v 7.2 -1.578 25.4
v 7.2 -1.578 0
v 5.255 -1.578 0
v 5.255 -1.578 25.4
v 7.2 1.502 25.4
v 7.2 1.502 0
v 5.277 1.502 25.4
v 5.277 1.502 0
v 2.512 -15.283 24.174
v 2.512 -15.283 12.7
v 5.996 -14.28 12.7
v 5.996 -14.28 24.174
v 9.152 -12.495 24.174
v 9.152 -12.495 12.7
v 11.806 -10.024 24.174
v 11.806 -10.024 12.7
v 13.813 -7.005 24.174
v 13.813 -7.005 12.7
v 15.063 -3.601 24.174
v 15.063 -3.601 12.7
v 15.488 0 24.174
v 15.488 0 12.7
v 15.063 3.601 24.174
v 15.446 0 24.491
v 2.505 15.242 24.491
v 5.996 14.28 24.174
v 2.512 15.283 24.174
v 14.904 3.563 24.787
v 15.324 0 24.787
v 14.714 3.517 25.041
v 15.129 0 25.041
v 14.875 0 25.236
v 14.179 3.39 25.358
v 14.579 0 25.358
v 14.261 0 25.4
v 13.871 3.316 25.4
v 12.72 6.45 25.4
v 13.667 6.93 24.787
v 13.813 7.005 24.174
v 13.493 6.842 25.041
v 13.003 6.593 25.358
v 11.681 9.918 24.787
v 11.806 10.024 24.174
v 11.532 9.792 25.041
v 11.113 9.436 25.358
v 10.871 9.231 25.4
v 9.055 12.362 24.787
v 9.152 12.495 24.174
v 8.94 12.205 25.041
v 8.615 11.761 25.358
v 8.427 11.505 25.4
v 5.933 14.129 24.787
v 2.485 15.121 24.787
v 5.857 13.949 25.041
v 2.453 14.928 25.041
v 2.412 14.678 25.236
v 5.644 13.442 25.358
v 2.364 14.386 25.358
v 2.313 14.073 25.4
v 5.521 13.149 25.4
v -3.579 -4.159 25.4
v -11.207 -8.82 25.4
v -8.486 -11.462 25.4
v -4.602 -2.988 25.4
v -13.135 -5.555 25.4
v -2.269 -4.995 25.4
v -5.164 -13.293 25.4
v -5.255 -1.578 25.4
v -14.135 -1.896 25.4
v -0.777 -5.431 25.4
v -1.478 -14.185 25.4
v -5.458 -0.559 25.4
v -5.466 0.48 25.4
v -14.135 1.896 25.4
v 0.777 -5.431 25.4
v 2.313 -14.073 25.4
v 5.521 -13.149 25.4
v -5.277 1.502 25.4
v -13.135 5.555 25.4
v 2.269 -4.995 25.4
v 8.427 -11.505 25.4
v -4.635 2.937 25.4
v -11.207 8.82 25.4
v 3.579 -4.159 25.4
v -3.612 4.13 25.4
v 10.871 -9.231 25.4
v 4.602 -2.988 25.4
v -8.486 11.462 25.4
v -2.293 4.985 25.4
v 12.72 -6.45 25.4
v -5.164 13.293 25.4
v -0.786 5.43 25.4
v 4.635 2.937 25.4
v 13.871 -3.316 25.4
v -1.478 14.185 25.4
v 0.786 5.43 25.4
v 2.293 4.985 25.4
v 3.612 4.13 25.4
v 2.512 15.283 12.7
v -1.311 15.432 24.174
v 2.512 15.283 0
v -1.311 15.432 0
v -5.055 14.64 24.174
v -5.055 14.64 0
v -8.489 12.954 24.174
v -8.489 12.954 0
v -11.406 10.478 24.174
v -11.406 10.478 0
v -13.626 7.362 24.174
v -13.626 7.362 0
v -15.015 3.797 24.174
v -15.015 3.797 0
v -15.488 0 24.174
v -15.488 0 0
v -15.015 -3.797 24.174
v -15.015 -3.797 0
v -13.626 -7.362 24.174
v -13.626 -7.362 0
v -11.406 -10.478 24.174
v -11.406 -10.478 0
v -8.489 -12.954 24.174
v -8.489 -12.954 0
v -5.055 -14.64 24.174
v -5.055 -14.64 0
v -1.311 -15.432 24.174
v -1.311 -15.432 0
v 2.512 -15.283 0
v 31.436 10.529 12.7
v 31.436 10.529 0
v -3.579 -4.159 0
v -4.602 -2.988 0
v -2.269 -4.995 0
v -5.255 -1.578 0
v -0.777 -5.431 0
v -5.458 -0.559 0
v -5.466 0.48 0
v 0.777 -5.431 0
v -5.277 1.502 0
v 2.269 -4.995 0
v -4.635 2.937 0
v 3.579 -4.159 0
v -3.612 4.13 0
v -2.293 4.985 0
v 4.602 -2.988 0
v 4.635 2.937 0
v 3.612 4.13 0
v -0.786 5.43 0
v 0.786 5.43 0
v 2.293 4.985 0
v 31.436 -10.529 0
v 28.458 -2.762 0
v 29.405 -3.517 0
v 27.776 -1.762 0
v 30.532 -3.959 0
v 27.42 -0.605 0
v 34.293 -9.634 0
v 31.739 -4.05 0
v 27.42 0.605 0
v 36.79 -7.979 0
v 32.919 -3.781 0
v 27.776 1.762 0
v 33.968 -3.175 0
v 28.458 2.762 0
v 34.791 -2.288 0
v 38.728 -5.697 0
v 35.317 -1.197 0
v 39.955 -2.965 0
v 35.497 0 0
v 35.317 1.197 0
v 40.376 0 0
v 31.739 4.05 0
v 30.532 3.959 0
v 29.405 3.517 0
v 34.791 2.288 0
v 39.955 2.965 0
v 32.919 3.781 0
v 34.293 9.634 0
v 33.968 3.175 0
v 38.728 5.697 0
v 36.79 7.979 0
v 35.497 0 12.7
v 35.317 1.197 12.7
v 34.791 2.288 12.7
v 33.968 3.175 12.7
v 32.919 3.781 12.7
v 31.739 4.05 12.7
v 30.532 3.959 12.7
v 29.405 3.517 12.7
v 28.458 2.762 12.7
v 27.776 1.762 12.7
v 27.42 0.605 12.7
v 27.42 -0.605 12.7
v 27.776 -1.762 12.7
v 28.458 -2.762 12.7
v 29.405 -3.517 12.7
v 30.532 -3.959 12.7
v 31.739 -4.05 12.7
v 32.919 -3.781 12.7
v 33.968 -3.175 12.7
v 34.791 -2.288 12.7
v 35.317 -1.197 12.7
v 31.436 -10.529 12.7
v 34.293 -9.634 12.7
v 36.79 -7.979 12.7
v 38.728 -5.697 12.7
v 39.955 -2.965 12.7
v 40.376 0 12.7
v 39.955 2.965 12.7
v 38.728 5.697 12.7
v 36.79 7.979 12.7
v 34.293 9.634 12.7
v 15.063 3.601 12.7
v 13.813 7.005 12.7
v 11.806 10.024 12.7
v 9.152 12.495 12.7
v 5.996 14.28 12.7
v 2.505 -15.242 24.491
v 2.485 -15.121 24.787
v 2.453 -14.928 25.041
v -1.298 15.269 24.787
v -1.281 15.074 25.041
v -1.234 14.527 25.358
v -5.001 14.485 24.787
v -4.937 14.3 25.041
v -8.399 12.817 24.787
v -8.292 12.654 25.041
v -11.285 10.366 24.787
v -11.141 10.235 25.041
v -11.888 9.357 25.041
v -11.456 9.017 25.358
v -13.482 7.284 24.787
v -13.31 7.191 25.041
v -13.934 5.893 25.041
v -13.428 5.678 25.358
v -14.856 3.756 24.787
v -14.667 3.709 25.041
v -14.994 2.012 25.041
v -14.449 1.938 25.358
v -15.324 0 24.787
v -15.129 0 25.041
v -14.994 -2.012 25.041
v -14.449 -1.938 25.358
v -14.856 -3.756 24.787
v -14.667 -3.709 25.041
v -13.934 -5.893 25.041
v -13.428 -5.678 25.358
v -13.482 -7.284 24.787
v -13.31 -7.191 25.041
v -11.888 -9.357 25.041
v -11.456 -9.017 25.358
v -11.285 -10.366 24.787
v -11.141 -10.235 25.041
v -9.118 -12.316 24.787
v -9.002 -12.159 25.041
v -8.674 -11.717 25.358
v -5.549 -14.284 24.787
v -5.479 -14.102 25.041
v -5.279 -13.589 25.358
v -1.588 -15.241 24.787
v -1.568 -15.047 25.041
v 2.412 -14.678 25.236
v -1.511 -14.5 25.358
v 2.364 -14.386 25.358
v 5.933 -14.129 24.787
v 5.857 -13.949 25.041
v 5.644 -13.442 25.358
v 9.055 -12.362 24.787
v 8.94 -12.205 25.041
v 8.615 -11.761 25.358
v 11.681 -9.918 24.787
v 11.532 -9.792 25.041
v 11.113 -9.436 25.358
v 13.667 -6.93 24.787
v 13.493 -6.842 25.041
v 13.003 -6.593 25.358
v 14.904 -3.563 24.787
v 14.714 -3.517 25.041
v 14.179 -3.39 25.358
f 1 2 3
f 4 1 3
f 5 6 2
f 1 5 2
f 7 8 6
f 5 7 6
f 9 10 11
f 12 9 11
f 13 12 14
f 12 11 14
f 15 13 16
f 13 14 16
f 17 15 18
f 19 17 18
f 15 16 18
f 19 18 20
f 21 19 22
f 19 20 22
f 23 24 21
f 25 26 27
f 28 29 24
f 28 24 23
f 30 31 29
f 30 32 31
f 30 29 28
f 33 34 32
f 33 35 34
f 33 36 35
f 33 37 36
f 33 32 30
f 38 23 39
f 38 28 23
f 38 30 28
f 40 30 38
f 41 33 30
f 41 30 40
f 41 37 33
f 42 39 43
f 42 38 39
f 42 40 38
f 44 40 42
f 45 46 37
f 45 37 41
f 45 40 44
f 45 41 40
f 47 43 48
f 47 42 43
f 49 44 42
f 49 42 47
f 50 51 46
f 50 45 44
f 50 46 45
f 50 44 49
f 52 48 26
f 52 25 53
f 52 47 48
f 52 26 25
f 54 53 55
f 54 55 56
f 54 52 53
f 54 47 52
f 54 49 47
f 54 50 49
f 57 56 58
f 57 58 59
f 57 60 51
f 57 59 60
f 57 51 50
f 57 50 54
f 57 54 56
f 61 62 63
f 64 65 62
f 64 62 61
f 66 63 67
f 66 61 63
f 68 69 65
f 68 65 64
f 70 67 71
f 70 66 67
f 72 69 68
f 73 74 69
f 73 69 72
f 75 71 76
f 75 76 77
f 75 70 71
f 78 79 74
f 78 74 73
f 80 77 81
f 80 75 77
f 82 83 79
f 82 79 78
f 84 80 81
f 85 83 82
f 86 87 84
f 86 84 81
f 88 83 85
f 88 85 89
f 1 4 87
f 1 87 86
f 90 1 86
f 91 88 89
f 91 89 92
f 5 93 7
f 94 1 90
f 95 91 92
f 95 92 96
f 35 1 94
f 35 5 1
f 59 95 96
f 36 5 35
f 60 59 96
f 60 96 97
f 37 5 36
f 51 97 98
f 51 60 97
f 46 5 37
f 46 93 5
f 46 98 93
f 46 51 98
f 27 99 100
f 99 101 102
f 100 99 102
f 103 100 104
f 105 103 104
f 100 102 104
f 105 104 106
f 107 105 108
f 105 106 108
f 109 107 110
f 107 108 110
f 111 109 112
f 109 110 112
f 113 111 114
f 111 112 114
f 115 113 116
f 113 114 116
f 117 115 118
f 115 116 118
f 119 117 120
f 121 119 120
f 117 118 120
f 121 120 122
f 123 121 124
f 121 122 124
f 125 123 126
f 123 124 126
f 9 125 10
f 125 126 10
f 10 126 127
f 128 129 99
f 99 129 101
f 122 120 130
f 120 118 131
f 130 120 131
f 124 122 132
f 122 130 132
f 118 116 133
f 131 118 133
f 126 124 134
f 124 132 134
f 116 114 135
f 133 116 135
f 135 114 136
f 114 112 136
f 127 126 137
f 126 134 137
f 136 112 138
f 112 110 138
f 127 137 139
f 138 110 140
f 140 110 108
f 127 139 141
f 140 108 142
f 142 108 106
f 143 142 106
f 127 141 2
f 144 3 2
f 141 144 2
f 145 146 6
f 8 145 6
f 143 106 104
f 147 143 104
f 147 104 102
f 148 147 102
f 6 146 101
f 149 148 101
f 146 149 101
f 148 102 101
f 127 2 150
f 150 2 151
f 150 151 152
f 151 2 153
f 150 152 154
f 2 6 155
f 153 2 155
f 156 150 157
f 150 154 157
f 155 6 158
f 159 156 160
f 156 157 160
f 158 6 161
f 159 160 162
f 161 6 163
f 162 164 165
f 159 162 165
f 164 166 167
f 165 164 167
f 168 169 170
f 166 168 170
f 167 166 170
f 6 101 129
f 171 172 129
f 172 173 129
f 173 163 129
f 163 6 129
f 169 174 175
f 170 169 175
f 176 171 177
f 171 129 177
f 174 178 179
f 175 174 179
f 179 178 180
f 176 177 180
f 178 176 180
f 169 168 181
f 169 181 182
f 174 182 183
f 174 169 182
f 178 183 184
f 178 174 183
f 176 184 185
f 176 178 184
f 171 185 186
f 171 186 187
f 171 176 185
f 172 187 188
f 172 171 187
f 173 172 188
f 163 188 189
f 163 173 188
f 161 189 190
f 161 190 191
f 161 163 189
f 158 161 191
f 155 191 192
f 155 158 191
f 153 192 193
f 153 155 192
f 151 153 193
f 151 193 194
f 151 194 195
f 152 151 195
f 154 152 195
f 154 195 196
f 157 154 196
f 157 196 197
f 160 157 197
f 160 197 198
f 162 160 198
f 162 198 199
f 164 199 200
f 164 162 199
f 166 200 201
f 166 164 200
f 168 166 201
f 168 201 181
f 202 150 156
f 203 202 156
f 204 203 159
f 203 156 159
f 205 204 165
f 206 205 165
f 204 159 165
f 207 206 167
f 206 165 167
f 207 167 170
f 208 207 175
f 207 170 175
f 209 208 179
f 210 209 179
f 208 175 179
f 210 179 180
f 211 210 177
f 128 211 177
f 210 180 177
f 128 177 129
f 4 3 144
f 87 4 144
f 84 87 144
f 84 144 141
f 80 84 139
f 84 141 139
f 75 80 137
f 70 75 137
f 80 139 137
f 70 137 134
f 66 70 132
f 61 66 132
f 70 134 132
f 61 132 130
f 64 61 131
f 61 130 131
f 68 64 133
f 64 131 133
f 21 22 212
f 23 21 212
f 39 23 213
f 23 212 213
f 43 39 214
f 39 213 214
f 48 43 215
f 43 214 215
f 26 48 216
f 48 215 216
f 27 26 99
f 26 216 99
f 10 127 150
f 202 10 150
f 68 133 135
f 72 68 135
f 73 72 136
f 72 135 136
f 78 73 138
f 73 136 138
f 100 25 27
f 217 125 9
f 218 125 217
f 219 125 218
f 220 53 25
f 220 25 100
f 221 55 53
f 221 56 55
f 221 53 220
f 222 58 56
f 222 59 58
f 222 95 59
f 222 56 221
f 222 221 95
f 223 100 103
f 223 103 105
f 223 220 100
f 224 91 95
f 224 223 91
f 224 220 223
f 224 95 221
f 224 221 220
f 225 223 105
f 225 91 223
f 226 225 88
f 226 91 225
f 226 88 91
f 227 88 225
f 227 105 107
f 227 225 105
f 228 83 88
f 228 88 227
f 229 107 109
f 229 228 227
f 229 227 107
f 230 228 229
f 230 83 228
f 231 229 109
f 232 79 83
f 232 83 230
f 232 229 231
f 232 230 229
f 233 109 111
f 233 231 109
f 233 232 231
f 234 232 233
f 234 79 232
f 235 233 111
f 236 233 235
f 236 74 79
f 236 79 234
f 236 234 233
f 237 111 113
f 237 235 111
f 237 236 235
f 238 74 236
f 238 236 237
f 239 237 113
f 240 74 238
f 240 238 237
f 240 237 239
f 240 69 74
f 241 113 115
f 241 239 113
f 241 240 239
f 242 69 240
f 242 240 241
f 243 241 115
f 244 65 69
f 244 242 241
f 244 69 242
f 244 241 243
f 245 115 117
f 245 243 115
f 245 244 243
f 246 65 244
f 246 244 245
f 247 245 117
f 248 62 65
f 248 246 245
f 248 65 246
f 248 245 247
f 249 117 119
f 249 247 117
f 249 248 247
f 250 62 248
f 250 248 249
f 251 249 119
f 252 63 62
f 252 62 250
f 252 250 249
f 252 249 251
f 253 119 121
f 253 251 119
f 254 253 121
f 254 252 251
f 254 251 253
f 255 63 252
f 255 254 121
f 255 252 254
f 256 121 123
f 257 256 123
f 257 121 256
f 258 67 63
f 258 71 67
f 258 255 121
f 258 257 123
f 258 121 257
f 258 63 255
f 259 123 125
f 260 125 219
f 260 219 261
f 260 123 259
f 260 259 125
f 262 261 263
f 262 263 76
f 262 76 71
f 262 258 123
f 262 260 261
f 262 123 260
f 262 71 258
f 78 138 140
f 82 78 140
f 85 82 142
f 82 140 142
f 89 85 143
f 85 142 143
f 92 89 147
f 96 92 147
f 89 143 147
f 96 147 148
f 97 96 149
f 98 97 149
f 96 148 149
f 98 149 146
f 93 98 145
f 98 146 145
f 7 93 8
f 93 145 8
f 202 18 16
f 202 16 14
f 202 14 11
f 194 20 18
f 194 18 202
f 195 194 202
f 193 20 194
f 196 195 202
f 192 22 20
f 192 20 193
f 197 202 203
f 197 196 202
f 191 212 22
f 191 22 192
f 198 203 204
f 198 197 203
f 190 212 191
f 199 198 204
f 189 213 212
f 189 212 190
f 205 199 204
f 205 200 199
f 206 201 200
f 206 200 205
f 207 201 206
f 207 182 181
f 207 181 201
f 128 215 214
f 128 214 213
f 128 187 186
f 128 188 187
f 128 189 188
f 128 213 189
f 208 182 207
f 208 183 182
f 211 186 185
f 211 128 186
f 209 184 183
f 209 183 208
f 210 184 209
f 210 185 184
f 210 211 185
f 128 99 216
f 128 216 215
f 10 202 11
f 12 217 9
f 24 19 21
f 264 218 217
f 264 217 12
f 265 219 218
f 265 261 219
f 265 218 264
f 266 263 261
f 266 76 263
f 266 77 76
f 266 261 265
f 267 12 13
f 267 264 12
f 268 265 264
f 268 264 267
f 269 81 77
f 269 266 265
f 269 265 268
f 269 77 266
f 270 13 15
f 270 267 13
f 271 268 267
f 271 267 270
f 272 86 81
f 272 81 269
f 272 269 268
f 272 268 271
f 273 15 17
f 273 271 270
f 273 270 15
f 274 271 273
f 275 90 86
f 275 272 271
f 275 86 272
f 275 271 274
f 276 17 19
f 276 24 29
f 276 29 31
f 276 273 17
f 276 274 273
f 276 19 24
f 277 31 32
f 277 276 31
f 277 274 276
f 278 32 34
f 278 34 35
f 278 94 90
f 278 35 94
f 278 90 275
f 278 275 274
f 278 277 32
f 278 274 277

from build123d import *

# Parameters (mm, degrees)
F0_R     = 4.061318
F1_DEPTH = 12.7
F2_DEPTH = 25.4
F3_R     = 1.22642


with BuildPart() as f1:
    # F0 (on Top) → F1 (new body)
    with BuildSketch(Plane.XY):
        with BuildLine():
            ThreePointArc((2.511697, 15.282841), (11.806241, 10.024297), (15.487861, 0))
            ThreePointArc((15.487861, 0), (11.806241, -10.024297), (2.511697, -15.282841))
            Line((2.511697, -15.282841), (31.435615, -10.529267))
            ThreePointArc((31.435615, -10.529267), (40.375675, 0), (31.435615, 10.529267))
            Line((31.435615, 10.529267), (2.511697, 15.282841))
        make_face()
        with Locations((31.435615, 0)):
            Circle(F0_R, mode=Mode.SUBTRACT)
        with BuildLine():
            ThreePointArc((2.511697, -15.282841), (11.806241, -10.024297), (15.487861, 0))
            ThreePointArc((15.487861, 0), (11.806241, 10.024297), (2.511697, 15.282841))
            ThreePointArc((2.511697, 15.282841), (-15.487861, 0), (2.511697, -15.282841))
        make_face()
        with BuildLine():
            ThreePointArc((-5.276986, 1.502324), (0, 5.486671), (5.276986, 1.502324))
            Line((5.276986, 1.502324), (7.19986, 1.502324))
            Line((7.19986, 1.502324), (7.19986, -1.577626))
            Line((7.19986, -1.577626), (5.254965, -1.577626))
            ThreePointArc((5.254965, -1.577626), (0, -5.486671), (-5.254965, -1.577626))
            Line((-5.254965, -1.577626), (-7.429904, -1.577626))
            Line((-7.429904, -1.577626), (-7.429904, 1.502324))
            Line((-7.429904, 1.502324), (-5.276986, 1.502324))
        make_face(mode=Mode.SUBTRACT)
        with BuildLine():
            ThreePointArc((-5.254965, -1.577626), (-5.486531, -0.039228), (-5.276986, 1.502324))
            Line((-5.276986, 1.502324), (-7.429904, 1.502324))
            Line((-7.429904, 1.502324), (-7.429904, -1.577626))
            Line((-7.429904, -1.577626), (-5.254965, -1.577626))
        make_face()
    extrude(amount=F1_DEPTH)

    # F0 (on Top) → F2 (join)
    with BuildSketch(Plane.XY):
        with BuildLine():
            ThreePointArc((2.511697, -15.282841), (11.806241, -10.024297), (15.487861, 0))
            ThreePointArc((15.487861, 0), (11.806241, 10.024297), (2.511697, 15.282841))
            ThreePointArc((2.511697, 15.282841), (-15.487861, 0), (2.511697, -15.282841))
        make_face()
        with BuildLine():
            ThreePointArc((-5.276986, 1.502324), (0, 5.486671), (5.276986, 1.502324))
            Line((5.276986, 1.502324), (7.19986, 1.502324))
            Line((7.19986, 1.502324), (7.19986, -1.577626))
            Line((7.19986, -1.577626), (5.254965, -1.577626))
            ThreePointArc((5.254965, -1.577626), (0, -5.486671), (-5.254965, -1.577626))
            Line((-5.254965, -1.577626), (-7.429904, -1.577626))
            Line((-7.429904, -1.577626), (-7.429904, 1.502324))
            Line((-7.429904, 1.502324), (-5.276986, 1.502324))
        make_face(mode=Mode.SUBTRACT)
        with BuildLine():
            ThreePointArc((-5.254965, -1.577626), (-5.486531, -0.039228), (-5.276986, 1.502324))
            Line((-5.276986, 1.502324), (-7.429904, 1.502324))
            Line((-7.429904, 1.502324), (-7.429904, -1.577626))
            Line((-7.429904, -1.577626), (-5.254965, -1.577626))
        make_face()
    extrude(amount=F2_DEPTH)

    # F3
    f3_edges = [f1.edges().sort_by_distance(p)[0] for p in [
        (-2.511697, 15.282841, 25.4),
    ]]
    fillet(f3_edges, radius=F3_R)


solid = f1.part
